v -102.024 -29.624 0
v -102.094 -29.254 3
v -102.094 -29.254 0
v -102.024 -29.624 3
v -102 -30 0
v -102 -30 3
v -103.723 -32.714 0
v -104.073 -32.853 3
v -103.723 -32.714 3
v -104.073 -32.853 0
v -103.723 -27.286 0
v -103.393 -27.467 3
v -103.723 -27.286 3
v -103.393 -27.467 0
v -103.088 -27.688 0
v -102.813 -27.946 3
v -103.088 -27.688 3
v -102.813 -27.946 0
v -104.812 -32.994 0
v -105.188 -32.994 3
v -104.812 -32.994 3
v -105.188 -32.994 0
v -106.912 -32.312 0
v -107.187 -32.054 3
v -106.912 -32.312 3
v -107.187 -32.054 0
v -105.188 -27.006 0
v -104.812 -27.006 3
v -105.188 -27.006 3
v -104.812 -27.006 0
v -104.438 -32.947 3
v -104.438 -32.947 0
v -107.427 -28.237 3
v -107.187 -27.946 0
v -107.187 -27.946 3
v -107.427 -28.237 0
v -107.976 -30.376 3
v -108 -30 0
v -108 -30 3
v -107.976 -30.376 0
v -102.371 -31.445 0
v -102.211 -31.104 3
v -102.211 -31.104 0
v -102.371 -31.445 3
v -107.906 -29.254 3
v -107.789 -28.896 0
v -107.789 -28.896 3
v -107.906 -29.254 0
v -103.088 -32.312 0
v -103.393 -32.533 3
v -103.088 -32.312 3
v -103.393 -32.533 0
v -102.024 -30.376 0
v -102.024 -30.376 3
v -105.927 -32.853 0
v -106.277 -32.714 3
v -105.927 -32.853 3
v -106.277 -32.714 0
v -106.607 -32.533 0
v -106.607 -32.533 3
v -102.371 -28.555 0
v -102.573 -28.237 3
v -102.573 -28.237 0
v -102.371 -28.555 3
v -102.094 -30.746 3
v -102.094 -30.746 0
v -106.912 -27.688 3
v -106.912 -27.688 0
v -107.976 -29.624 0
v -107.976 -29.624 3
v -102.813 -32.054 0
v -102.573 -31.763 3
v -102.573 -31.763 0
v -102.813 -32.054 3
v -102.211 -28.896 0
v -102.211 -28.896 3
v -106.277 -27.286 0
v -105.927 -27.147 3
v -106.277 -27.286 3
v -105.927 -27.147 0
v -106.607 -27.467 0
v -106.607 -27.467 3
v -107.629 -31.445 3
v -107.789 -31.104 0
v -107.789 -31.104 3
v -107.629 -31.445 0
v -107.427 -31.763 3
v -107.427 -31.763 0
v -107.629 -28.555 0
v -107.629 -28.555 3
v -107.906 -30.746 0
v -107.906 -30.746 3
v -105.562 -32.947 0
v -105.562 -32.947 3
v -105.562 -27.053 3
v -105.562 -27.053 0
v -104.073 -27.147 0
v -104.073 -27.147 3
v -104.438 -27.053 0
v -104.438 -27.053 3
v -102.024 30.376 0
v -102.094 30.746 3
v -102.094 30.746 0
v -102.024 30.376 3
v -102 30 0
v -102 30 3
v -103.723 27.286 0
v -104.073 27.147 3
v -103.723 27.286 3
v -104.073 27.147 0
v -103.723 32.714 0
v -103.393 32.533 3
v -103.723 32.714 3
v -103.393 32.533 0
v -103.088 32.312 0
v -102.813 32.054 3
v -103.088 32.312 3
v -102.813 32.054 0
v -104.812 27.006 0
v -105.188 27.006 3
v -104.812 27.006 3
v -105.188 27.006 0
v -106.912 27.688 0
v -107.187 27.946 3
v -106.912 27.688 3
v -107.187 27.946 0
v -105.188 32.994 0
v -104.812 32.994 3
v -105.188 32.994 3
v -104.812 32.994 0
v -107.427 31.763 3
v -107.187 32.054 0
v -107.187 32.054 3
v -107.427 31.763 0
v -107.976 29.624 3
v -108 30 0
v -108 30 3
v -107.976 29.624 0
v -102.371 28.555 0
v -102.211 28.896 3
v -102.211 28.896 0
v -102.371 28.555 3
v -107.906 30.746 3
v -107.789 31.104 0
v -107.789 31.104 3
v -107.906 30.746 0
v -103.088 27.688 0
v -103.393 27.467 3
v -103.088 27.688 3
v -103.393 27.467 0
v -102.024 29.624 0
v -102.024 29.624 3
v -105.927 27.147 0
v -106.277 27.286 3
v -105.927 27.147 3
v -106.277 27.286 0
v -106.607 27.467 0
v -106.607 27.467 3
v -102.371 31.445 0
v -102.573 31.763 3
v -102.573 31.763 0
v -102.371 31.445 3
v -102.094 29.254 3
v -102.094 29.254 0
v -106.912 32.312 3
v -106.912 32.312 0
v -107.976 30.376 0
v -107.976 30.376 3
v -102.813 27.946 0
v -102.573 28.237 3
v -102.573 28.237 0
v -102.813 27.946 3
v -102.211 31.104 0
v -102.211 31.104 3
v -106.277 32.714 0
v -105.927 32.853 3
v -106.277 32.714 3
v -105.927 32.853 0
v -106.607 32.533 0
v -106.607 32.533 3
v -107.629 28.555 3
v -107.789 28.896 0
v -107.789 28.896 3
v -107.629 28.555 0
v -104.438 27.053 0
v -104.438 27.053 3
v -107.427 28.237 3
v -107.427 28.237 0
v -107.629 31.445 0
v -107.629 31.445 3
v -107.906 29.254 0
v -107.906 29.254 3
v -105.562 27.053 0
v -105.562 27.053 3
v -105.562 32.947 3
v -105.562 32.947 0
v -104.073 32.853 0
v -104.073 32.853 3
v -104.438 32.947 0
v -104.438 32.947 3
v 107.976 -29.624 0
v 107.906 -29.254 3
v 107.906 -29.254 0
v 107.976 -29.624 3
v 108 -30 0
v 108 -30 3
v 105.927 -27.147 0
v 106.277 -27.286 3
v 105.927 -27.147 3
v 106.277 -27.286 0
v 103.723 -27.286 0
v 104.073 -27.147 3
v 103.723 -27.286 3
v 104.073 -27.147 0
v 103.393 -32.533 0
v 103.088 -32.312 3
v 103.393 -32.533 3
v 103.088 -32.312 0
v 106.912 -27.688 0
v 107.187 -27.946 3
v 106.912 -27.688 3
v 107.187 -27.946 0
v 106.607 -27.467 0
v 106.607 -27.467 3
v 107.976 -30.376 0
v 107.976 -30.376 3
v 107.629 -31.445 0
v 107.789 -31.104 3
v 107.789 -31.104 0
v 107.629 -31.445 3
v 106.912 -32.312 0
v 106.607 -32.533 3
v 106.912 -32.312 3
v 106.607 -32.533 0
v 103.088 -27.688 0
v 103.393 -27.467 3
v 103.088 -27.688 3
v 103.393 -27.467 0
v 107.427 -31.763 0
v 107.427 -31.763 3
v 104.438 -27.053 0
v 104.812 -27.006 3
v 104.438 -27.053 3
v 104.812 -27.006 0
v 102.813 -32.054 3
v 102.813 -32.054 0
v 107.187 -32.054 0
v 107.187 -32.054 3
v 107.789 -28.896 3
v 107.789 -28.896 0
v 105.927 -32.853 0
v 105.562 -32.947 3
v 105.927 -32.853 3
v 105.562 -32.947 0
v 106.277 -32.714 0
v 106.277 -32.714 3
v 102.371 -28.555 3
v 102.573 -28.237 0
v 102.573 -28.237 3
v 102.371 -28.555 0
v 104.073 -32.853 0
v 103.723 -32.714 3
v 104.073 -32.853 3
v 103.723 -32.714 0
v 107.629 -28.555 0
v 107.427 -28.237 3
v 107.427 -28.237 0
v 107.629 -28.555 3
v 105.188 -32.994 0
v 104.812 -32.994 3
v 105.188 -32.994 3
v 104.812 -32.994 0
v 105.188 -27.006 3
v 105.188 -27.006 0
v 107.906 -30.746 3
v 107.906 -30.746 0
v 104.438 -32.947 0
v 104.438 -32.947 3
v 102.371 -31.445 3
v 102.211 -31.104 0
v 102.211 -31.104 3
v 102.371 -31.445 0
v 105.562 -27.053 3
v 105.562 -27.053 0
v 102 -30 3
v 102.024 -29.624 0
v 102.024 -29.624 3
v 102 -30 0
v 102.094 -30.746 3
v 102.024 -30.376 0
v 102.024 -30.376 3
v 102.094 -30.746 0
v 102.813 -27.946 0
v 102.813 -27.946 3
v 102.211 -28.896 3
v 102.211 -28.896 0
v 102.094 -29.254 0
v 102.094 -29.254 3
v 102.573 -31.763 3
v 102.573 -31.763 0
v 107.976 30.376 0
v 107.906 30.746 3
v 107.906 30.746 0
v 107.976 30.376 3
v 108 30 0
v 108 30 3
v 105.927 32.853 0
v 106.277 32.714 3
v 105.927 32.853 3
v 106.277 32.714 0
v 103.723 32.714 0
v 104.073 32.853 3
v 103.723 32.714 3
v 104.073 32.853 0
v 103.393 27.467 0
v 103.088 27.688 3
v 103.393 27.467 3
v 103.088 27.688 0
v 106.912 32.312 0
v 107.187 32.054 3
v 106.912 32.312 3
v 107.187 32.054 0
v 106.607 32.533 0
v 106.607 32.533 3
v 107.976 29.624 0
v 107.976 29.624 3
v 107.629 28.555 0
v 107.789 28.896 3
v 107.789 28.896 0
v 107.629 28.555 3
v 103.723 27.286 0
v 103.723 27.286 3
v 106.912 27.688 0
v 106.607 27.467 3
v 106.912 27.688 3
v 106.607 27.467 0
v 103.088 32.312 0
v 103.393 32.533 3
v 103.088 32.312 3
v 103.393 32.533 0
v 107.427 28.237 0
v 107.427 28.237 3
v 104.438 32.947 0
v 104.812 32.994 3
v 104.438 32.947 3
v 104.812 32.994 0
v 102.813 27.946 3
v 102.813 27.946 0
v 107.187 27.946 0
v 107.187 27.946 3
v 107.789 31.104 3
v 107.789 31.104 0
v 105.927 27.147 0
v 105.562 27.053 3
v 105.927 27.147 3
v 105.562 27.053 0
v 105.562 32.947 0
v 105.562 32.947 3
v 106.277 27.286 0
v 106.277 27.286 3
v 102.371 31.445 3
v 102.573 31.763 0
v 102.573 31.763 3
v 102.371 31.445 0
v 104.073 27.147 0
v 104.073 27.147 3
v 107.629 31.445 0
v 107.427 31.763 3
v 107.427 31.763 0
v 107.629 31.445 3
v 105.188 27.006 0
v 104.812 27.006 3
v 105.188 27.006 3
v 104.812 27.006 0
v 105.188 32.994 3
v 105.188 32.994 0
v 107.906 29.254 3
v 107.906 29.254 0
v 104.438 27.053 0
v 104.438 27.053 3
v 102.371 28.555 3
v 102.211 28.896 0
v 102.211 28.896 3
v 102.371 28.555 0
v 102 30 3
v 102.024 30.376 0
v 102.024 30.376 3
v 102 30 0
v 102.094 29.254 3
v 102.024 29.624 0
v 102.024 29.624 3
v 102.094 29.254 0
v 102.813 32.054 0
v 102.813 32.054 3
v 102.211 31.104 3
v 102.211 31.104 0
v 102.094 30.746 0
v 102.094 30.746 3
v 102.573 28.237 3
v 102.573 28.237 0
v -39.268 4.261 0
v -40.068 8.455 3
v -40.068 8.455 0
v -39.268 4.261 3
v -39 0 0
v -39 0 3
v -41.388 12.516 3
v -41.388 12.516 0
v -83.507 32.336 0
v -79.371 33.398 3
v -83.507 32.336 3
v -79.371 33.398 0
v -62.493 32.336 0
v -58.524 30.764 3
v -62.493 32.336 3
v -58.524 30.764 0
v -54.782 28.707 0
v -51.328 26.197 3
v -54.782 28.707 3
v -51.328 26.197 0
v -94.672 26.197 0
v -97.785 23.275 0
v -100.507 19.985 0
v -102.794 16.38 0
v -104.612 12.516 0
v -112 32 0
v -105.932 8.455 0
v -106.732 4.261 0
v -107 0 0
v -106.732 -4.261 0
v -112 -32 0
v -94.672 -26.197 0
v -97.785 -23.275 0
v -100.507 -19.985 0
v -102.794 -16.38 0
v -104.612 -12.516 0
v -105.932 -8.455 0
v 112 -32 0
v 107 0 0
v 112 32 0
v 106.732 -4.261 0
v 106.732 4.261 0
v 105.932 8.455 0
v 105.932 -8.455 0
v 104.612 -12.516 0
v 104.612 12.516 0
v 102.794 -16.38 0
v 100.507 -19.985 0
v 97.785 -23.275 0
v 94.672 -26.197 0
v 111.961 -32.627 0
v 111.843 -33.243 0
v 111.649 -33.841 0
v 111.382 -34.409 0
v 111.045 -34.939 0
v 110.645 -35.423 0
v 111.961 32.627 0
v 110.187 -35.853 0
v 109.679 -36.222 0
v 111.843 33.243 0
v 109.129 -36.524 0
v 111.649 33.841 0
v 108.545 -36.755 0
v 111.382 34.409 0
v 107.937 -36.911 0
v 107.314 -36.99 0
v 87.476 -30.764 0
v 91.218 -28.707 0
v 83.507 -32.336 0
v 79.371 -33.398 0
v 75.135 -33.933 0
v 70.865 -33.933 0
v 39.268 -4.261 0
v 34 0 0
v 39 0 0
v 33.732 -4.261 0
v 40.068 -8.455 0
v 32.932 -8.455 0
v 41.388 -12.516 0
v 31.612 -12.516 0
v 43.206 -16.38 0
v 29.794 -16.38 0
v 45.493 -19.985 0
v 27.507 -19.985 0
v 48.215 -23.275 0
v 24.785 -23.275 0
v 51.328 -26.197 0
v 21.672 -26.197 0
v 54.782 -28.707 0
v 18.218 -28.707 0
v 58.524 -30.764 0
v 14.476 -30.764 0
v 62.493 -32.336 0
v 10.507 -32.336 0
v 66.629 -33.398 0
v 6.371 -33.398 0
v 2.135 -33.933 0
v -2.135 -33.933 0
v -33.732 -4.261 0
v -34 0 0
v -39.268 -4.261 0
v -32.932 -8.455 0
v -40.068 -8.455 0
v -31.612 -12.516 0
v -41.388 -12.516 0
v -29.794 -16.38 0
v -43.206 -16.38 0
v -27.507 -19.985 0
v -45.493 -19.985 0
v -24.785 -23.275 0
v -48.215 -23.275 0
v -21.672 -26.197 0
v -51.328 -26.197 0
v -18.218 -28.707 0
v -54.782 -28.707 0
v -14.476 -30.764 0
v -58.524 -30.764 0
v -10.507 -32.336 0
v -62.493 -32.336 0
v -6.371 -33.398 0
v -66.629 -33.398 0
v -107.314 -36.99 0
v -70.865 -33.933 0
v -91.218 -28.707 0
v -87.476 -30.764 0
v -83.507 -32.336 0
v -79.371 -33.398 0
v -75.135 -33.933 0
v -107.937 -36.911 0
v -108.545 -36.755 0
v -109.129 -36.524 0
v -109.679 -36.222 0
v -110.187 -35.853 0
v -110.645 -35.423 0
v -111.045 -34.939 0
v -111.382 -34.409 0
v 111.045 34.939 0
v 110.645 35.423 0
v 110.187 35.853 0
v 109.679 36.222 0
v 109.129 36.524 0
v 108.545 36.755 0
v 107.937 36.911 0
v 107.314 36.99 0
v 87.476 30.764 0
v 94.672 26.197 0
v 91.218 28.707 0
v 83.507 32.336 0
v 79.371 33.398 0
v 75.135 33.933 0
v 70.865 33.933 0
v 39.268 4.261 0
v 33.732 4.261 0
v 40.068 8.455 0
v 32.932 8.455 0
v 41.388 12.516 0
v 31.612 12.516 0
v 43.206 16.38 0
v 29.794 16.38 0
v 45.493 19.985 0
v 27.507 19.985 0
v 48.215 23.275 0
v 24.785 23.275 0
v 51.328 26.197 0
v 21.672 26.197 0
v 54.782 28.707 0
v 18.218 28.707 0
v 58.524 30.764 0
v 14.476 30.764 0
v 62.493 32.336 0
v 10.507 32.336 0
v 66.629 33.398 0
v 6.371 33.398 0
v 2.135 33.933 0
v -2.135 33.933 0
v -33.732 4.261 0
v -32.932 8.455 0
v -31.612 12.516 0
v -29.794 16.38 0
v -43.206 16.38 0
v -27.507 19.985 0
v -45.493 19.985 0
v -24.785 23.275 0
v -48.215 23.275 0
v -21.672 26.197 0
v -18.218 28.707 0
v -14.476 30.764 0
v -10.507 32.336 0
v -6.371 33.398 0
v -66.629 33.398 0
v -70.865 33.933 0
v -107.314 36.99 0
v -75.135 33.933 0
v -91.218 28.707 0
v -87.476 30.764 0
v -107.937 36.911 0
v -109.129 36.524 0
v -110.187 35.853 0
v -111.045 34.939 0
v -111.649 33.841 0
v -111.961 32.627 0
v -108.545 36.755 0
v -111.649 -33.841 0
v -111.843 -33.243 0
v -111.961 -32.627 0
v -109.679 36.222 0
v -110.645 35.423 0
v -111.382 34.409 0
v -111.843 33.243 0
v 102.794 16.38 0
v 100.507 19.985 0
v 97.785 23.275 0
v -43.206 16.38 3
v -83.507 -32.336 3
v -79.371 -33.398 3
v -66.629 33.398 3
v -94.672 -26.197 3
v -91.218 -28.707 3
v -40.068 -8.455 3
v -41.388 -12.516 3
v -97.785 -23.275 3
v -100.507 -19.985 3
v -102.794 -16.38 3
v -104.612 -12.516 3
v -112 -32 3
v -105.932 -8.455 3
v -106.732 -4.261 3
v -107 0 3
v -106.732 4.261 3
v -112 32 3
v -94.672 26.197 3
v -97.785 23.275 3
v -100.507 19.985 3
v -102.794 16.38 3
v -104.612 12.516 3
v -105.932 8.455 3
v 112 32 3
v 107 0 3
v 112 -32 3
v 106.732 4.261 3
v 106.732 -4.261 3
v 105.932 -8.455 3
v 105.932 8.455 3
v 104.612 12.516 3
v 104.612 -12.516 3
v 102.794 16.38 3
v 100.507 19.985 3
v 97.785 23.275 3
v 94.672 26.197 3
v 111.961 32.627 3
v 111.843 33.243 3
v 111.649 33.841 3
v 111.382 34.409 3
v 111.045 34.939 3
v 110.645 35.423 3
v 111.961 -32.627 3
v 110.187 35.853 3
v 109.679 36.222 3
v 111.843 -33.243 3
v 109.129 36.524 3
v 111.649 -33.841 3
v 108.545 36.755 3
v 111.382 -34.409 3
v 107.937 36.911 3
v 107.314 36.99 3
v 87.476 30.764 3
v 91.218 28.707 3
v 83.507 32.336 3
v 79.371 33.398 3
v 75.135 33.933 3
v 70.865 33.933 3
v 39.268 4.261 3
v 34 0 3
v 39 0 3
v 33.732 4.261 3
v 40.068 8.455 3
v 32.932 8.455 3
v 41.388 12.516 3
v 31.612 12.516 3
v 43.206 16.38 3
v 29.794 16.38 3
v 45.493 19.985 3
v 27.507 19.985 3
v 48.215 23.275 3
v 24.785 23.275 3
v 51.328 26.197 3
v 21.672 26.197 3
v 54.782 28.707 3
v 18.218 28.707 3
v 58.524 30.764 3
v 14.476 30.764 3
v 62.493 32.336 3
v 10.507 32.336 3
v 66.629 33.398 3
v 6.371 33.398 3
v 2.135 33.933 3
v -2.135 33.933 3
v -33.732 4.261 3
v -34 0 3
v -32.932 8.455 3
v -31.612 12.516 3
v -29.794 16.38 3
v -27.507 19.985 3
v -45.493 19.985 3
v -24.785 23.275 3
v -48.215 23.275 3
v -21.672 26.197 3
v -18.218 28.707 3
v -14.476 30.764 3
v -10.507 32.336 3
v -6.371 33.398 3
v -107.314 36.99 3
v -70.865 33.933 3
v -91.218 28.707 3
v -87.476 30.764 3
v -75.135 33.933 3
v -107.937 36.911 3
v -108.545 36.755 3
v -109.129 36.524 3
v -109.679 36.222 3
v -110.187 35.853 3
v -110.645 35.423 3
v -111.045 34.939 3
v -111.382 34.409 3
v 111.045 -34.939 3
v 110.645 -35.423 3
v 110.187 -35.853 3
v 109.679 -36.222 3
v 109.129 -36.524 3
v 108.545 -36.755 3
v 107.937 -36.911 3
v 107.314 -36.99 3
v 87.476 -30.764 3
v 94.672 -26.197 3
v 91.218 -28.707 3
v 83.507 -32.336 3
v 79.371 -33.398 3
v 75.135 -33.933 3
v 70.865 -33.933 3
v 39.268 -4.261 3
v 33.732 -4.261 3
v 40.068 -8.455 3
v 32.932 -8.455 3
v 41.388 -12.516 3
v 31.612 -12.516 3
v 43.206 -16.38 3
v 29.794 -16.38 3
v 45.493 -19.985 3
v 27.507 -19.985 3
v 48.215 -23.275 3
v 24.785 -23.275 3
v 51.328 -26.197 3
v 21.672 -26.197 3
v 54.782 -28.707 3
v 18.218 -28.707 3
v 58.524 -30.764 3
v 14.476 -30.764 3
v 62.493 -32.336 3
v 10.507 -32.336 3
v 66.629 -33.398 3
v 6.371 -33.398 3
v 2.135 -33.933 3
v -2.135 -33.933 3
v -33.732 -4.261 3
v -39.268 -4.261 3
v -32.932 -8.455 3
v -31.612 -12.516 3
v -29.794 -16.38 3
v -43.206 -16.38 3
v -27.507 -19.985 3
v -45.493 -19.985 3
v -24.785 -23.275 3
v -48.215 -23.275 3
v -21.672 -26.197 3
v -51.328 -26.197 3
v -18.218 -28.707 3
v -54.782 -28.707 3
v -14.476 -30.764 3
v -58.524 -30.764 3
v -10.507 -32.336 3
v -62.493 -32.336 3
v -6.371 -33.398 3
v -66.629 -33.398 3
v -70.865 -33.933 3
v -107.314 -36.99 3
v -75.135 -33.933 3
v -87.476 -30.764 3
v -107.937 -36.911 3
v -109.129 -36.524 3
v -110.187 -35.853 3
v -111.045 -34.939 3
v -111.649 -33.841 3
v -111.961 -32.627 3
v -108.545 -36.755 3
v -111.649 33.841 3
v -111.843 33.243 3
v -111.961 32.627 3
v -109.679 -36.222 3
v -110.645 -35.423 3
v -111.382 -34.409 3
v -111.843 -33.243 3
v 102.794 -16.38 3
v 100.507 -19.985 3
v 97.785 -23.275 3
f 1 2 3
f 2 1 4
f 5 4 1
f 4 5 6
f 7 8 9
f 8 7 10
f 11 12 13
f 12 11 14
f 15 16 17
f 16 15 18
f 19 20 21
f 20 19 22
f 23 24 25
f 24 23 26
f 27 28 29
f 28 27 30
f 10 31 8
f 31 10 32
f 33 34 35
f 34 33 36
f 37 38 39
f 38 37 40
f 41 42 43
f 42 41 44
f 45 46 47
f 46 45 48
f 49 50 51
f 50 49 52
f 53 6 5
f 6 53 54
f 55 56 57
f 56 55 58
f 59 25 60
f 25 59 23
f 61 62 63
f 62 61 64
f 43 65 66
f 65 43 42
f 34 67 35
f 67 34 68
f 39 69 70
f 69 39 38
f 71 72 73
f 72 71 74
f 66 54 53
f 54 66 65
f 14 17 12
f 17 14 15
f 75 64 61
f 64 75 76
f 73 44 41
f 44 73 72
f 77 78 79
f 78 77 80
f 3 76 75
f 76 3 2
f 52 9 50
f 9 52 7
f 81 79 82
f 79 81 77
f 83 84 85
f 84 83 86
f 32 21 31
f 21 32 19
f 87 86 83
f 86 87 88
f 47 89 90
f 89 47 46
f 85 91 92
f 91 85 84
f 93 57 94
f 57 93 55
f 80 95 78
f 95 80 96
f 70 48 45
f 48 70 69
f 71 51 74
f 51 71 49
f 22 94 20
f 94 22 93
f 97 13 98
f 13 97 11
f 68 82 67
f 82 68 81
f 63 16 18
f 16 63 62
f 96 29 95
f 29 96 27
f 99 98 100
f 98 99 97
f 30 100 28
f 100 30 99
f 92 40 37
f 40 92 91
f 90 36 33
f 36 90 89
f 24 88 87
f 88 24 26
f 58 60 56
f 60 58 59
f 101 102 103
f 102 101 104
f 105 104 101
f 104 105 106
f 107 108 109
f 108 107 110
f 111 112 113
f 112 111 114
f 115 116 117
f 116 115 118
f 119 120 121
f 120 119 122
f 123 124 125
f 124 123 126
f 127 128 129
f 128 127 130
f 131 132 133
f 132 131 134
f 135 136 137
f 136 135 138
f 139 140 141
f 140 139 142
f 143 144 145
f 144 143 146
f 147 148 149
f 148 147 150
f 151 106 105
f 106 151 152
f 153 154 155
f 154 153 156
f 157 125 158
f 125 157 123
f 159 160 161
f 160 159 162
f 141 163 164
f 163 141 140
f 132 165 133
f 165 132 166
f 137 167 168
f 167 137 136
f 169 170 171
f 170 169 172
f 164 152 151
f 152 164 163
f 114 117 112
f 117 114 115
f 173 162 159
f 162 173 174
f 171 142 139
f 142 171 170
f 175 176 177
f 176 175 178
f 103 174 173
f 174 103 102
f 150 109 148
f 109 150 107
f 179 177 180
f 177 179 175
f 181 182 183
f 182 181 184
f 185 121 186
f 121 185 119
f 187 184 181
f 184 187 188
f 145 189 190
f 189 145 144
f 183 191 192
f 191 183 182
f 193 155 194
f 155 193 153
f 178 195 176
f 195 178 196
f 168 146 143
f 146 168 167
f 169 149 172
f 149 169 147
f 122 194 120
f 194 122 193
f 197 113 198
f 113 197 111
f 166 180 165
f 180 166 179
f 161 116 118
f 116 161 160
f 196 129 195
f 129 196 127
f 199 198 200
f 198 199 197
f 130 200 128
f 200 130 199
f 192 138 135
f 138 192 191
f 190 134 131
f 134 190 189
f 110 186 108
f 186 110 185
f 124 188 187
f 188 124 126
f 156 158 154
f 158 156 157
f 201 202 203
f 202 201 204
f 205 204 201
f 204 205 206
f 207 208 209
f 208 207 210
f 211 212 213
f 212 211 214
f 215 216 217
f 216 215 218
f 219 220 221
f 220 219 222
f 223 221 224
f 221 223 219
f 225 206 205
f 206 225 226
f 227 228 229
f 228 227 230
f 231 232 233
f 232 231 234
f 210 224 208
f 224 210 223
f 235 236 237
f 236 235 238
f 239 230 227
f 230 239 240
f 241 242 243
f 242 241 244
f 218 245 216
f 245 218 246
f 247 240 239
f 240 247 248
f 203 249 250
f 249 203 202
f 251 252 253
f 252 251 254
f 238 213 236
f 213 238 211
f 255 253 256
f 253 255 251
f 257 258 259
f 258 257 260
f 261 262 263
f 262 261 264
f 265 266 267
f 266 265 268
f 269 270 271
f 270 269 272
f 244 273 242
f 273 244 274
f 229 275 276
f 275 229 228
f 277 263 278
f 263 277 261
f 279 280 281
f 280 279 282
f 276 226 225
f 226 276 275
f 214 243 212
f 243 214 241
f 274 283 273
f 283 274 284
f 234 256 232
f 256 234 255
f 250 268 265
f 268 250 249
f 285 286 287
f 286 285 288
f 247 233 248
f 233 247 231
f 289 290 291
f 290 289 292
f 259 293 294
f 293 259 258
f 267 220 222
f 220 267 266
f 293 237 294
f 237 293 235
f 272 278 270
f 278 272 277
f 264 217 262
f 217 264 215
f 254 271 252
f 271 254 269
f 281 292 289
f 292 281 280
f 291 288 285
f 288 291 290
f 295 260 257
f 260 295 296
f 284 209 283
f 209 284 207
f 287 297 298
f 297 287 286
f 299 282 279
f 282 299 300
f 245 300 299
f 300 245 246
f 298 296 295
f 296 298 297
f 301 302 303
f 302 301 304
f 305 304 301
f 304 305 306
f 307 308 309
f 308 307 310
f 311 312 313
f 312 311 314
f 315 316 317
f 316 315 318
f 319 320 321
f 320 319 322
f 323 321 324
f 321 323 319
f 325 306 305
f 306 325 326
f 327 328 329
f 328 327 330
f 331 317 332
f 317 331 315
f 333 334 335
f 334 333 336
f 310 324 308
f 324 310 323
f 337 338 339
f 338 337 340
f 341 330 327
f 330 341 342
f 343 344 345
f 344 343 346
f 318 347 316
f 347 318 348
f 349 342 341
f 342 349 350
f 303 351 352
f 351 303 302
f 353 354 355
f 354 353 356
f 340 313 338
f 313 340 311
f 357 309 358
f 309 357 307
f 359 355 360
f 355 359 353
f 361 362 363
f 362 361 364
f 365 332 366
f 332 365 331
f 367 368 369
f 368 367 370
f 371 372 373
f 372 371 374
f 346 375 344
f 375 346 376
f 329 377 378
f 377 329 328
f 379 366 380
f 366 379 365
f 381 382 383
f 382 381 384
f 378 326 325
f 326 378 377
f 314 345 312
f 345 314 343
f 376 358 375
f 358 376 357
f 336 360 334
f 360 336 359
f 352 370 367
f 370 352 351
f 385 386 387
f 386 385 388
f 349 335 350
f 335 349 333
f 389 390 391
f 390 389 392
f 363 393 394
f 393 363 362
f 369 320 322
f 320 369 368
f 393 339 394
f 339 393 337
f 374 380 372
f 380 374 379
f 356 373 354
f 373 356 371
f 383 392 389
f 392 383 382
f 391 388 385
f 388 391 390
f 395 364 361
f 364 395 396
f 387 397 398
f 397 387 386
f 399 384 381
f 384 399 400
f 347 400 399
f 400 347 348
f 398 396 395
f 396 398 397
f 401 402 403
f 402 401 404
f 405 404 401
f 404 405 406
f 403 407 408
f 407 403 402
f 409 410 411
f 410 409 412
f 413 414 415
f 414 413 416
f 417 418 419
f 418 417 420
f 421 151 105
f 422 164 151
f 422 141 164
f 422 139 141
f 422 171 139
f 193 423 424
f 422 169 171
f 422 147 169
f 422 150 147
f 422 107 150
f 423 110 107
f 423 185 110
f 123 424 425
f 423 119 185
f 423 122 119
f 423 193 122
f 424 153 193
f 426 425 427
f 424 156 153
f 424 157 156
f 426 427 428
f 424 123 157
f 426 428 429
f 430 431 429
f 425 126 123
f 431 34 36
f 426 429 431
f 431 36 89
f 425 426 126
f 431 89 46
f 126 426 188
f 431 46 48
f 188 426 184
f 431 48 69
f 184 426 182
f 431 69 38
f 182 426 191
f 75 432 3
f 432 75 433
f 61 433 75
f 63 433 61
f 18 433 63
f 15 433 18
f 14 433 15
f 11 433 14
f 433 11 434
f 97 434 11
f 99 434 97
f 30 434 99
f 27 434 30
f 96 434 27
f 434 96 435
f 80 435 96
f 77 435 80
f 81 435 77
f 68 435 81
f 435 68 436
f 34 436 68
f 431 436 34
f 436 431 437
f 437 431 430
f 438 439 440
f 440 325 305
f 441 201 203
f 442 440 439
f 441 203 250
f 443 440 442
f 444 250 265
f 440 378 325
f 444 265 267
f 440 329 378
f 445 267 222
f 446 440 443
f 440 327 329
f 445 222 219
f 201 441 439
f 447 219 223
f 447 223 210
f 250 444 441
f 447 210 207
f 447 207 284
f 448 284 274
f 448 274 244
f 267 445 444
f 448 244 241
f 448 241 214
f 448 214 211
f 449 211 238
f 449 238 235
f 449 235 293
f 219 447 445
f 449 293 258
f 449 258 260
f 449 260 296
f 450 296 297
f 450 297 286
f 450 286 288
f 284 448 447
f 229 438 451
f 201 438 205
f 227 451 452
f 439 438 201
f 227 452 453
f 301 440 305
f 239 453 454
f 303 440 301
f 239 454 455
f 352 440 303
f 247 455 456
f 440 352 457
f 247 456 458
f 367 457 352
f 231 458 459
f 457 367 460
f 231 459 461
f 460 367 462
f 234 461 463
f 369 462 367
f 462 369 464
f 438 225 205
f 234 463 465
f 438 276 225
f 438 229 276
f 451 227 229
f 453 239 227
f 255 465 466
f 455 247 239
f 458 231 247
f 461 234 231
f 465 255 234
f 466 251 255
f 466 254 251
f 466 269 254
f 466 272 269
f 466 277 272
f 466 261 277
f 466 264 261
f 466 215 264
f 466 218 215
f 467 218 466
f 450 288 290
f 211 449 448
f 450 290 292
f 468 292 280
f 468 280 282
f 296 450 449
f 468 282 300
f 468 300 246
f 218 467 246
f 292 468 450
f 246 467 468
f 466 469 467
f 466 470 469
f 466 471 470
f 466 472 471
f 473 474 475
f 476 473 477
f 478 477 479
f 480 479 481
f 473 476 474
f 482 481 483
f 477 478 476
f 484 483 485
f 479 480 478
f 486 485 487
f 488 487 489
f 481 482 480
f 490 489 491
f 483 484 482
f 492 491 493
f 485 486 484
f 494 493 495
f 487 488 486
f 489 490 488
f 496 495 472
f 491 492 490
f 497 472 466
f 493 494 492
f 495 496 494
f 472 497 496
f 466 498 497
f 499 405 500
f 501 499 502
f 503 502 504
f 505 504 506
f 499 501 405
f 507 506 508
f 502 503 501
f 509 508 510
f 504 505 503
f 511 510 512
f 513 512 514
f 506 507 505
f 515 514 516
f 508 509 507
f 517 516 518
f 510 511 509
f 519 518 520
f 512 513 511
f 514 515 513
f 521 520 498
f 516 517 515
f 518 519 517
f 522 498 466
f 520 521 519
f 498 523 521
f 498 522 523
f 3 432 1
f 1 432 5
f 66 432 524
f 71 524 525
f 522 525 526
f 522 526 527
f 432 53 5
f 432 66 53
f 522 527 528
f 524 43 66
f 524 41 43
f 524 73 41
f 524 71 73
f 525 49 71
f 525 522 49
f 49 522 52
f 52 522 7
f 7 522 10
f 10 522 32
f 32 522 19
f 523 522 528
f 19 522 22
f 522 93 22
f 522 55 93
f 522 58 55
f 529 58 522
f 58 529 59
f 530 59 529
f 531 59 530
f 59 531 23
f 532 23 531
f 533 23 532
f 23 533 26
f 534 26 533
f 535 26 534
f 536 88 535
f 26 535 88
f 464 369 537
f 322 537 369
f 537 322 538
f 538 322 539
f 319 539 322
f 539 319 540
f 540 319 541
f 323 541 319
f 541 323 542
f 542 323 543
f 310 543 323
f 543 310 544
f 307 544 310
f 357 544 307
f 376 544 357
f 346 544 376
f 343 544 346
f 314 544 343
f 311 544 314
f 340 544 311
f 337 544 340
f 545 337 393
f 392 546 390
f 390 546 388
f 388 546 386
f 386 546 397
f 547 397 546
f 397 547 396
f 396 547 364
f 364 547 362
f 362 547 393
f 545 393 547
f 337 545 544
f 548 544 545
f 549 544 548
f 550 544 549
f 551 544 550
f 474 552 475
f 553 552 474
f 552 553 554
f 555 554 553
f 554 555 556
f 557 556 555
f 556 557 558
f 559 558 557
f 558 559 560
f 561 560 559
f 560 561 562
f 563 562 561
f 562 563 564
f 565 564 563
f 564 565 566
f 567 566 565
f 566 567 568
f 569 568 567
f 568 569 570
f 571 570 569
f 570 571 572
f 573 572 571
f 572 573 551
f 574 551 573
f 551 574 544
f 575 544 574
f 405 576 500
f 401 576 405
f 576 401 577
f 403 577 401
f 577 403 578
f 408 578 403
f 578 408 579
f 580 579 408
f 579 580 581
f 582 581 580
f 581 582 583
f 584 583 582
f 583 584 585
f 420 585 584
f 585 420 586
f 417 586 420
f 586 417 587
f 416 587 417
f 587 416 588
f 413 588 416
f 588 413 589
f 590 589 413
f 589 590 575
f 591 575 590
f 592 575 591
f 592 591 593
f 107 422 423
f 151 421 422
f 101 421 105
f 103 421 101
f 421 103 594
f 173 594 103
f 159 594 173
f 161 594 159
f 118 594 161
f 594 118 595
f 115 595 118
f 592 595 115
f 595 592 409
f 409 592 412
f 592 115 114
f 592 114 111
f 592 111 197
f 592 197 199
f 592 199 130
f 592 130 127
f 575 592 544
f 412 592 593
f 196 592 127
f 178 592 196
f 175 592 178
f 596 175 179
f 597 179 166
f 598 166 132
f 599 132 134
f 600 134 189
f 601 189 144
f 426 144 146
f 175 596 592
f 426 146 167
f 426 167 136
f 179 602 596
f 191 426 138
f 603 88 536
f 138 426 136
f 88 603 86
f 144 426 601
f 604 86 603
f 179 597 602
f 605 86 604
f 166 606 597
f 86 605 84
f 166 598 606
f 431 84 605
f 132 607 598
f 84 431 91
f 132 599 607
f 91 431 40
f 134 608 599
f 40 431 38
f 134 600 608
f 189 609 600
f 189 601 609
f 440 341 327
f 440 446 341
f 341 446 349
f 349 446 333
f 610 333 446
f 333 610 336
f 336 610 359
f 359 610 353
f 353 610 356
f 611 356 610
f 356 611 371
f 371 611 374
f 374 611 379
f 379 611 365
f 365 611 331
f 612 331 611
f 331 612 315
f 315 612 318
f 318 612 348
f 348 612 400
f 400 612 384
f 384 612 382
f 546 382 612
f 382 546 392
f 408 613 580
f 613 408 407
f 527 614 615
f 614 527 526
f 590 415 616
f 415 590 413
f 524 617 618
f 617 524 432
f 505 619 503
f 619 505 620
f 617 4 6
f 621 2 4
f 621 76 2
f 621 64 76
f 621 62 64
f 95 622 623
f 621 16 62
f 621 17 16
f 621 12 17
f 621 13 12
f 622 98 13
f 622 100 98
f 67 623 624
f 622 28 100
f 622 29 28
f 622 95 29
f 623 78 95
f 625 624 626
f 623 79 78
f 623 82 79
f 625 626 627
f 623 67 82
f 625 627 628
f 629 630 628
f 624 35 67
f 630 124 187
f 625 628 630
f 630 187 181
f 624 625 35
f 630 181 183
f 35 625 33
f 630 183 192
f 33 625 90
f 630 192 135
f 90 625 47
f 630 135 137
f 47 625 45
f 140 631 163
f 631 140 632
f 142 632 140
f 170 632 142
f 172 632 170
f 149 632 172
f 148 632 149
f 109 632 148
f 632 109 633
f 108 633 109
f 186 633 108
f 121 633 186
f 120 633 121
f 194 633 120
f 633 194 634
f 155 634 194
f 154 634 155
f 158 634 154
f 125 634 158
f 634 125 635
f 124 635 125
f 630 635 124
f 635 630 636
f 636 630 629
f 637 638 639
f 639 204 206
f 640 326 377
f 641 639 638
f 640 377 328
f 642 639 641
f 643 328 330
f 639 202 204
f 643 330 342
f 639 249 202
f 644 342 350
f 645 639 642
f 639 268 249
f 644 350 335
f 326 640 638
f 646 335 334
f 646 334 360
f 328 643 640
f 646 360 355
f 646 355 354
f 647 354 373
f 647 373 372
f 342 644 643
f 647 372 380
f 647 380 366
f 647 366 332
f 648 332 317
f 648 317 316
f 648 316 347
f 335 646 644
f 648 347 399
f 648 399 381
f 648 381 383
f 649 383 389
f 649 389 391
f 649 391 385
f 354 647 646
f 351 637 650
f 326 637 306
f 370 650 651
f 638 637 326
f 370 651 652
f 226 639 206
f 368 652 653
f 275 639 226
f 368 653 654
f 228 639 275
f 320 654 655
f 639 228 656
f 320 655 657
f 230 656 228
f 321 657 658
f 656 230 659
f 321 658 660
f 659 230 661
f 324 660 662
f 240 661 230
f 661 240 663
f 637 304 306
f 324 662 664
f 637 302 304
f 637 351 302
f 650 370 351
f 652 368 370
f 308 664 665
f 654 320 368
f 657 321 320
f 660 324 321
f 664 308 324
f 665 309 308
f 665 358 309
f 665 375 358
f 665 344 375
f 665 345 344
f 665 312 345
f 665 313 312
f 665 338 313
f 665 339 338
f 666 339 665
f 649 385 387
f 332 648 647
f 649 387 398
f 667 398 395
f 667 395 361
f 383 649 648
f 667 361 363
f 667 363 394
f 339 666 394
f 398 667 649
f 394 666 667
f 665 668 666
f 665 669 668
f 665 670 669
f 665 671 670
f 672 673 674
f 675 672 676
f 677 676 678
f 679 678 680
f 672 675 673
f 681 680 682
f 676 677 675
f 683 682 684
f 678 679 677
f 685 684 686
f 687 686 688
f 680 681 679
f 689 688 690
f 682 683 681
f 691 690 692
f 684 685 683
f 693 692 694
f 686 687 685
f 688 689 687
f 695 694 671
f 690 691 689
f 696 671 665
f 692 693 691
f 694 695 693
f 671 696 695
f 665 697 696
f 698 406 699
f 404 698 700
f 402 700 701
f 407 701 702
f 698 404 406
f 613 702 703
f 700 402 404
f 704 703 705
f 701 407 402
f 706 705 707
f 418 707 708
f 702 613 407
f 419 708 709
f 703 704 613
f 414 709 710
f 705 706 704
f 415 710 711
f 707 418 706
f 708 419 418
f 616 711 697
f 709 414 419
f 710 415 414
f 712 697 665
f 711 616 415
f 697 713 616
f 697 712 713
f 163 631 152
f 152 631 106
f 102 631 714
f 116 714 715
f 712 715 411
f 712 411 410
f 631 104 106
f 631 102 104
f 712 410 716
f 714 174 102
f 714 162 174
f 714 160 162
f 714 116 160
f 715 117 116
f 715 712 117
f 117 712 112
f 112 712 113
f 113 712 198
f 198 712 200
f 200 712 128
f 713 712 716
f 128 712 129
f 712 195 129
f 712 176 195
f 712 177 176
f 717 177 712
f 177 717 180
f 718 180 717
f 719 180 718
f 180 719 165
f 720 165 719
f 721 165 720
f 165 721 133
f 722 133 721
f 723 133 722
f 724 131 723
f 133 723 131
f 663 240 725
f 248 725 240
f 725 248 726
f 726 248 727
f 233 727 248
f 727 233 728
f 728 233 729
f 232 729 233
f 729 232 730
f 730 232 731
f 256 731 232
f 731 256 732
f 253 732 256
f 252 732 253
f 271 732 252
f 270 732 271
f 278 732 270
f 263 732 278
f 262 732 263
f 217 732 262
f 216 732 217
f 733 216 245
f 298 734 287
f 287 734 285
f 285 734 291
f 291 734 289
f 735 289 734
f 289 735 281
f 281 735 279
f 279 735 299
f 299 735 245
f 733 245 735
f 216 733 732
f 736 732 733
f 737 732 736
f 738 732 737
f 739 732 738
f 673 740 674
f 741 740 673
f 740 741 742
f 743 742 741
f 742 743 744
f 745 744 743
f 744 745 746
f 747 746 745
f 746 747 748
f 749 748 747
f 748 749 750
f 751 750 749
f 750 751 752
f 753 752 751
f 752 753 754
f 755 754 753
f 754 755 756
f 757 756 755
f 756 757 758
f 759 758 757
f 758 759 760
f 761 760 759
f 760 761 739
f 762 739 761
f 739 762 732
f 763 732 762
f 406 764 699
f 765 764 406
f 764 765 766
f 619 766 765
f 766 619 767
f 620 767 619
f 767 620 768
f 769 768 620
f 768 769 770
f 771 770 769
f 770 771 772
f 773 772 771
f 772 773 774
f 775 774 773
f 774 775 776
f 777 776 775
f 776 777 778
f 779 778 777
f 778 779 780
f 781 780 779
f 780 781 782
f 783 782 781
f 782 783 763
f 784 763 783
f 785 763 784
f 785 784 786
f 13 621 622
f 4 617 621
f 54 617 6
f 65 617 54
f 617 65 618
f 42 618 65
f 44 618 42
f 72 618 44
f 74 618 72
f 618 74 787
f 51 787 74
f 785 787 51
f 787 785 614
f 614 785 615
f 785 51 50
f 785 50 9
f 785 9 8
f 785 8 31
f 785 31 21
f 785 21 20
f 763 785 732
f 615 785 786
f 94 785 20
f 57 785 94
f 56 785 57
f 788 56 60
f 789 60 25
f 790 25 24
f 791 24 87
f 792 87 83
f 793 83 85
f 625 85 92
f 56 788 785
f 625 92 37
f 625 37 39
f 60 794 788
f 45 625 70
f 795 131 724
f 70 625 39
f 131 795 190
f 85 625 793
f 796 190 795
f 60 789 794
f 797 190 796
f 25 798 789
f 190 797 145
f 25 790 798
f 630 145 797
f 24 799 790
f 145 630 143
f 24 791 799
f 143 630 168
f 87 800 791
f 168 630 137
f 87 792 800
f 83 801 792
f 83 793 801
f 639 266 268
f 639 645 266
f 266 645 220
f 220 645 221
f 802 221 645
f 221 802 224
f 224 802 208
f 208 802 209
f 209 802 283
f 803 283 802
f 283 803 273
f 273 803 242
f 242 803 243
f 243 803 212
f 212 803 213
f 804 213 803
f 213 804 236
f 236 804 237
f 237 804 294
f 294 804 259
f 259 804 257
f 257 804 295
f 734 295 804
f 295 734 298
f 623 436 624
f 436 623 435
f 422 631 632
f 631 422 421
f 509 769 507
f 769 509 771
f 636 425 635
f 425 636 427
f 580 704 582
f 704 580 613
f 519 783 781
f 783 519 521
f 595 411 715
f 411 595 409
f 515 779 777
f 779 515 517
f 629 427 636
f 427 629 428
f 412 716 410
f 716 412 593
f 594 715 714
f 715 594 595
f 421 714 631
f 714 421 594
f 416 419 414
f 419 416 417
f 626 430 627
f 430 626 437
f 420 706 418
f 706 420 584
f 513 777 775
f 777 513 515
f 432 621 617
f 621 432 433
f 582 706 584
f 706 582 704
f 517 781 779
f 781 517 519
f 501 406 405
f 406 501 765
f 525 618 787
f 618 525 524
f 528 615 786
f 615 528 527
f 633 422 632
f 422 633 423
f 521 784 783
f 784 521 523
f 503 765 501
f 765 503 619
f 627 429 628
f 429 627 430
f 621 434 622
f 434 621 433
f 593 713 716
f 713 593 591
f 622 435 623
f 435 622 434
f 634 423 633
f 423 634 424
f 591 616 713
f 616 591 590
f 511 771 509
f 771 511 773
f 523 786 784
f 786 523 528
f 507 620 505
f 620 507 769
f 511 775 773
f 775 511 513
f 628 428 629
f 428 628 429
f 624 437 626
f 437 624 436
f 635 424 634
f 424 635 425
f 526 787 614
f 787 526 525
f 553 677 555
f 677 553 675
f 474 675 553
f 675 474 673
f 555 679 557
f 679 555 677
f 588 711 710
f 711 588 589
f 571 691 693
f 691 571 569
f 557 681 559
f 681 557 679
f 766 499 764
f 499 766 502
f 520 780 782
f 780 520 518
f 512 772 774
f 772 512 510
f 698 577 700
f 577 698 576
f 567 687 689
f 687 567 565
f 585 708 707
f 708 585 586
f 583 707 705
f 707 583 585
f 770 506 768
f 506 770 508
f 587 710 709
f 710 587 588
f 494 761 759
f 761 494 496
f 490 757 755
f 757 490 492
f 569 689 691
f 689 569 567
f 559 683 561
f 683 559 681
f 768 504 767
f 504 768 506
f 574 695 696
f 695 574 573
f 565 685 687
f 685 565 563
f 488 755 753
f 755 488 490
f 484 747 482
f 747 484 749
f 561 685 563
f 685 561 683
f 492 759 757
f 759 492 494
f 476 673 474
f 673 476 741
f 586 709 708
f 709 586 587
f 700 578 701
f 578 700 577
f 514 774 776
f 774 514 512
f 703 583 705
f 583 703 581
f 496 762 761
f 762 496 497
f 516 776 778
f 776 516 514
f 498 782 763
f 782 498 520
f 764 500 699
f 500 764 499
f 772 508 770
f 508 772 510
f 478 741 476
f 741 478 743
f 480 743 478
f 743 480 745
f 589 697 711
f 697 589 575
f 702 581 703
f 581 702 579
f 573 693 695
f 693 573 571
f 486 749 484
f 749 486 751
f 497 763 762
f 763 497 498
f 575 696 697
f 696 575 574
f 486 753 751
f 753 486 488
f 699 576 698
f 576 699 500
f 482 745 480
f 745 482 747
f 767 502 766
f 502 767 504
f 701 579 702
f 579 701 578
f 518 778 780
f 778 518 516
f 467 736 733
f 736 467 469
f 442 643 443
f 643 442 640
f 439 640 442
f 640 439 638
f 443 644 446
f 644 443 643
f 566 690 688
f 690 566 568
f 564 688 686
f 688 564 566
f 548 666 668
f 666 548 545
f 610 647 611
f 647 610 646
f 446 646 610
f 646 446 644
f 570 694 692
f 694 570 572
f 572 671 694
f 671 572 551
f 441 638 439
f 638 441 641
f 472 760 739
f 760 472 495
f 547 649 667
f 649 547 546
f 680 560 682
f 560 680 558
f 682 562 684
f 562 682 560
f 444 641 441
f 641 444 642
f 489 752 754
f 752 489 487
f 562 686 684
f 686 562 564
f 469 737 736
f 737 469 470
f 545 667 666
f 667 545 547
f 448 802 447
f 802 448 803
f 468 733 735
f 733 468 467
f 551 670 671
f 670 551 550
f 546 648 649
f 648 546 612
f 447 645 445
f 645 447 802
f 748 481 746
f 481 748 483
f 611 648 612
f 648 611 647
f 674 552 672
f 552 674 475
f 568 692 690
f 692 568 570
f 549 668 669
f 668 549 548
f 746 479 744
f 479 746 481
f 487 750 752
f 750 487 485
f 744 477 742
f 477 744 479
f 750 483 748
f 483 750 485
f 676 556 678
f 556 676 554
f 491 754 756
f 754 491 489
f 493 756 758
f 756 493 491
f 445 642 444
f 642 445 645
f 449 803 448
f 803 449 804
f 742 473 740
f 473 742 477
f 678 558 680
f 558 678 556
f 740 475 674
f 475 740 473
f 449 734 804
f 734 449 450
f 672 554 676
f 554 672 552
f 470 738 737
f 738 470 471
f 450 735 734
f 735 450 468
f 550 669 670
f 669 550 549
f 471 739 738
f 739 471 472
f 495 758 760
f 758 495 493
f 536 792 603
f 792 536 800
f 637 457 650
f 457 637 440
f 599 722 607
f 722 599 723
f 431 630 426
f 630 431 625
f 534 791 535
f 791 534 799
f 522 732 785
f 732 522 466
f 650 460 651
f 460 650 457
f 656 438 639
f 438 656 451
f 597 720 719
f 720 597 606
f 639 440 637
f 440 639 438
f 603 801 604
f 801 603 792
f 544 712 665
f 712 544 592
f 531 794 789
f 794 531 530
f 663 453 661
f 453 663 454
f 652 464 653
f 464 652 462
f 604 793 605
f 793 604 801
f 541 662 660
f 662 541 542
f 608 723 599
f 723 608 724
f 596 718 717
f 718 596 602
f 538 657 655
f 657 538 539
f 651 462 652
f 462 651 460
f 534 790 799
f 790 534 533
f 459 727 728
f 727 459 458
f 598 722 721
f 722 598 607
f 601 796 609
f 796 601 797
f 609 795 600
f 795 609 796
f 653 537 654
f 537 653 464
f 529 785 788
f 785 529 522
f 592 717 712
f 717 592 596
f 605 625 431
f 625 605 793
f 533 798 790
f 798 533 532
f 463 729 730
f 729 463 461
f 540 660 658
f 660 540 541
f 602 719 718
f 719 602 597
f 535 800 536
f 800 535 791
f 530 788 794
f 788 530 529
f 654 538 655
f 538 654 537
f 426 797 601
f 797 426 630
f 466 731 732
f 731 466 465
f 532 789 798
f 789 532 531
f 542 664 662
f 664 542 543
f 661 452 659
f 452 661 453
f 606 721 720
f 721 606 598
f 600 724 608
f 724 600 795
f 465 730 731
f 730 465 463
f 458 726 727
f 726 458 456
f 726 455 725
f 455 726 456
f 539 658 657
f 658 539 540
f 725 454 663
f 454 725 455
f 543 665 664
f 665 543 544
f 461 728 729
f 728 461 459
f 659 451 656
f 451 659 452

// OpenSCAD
$fn = 50;


difference() {
	union() {
		hull() {
			translate(v = [-107.0000000000, 32.0000000000, 0]) {
				cylinder(h = 3, r = 5);
			}
			translate(v = [107.0000000000, 32.0000000000, 0]) {
				cylinder(h = 3, r = 5);
			}
			translate(v = [-107.0000000000, -32.0000000000, 0]) {
				cylinder(h = 3, r = 5);
			}
			translate(v = [107.0000000000, -32.0000000000, 0]) {
				cylinder(h = 3, r = 5);
			}
		}
	}
	union() {
		#translate(v = [-105.0000000000, -30.0000000000, -100.0000000000]) {
			cylinder(h = 200, r = 3.0000000000);
		}
		#translate(v = [-105.0000000000, 30.0000000000, -100.0000000000]) {
			cylinder(h = 200, r = 3.0000000000);
		}
		#translate(v = [105.0000000000, -30.0000000000, -100.0000000000]) {
			cylinder(h = 200, r = 3.0000000000);
		}
		#translate(v = [105.0000000000, 30.0000000000, -100.0000000000]) {
			cylinder(h = 200, r = 3.0000000000);
		}
		#translate(v = [-73.0000000000, 0, 0]) {
			cylinder(h = 3, r = 34.0000000000);
		}
		#cylinder(h = 3, r = 34.0000000000);
		#translate(v = [73.0000000000, 0, 0]) {
			cylinder(h = 3, r = 34.0000000000);
		}
	}
}
